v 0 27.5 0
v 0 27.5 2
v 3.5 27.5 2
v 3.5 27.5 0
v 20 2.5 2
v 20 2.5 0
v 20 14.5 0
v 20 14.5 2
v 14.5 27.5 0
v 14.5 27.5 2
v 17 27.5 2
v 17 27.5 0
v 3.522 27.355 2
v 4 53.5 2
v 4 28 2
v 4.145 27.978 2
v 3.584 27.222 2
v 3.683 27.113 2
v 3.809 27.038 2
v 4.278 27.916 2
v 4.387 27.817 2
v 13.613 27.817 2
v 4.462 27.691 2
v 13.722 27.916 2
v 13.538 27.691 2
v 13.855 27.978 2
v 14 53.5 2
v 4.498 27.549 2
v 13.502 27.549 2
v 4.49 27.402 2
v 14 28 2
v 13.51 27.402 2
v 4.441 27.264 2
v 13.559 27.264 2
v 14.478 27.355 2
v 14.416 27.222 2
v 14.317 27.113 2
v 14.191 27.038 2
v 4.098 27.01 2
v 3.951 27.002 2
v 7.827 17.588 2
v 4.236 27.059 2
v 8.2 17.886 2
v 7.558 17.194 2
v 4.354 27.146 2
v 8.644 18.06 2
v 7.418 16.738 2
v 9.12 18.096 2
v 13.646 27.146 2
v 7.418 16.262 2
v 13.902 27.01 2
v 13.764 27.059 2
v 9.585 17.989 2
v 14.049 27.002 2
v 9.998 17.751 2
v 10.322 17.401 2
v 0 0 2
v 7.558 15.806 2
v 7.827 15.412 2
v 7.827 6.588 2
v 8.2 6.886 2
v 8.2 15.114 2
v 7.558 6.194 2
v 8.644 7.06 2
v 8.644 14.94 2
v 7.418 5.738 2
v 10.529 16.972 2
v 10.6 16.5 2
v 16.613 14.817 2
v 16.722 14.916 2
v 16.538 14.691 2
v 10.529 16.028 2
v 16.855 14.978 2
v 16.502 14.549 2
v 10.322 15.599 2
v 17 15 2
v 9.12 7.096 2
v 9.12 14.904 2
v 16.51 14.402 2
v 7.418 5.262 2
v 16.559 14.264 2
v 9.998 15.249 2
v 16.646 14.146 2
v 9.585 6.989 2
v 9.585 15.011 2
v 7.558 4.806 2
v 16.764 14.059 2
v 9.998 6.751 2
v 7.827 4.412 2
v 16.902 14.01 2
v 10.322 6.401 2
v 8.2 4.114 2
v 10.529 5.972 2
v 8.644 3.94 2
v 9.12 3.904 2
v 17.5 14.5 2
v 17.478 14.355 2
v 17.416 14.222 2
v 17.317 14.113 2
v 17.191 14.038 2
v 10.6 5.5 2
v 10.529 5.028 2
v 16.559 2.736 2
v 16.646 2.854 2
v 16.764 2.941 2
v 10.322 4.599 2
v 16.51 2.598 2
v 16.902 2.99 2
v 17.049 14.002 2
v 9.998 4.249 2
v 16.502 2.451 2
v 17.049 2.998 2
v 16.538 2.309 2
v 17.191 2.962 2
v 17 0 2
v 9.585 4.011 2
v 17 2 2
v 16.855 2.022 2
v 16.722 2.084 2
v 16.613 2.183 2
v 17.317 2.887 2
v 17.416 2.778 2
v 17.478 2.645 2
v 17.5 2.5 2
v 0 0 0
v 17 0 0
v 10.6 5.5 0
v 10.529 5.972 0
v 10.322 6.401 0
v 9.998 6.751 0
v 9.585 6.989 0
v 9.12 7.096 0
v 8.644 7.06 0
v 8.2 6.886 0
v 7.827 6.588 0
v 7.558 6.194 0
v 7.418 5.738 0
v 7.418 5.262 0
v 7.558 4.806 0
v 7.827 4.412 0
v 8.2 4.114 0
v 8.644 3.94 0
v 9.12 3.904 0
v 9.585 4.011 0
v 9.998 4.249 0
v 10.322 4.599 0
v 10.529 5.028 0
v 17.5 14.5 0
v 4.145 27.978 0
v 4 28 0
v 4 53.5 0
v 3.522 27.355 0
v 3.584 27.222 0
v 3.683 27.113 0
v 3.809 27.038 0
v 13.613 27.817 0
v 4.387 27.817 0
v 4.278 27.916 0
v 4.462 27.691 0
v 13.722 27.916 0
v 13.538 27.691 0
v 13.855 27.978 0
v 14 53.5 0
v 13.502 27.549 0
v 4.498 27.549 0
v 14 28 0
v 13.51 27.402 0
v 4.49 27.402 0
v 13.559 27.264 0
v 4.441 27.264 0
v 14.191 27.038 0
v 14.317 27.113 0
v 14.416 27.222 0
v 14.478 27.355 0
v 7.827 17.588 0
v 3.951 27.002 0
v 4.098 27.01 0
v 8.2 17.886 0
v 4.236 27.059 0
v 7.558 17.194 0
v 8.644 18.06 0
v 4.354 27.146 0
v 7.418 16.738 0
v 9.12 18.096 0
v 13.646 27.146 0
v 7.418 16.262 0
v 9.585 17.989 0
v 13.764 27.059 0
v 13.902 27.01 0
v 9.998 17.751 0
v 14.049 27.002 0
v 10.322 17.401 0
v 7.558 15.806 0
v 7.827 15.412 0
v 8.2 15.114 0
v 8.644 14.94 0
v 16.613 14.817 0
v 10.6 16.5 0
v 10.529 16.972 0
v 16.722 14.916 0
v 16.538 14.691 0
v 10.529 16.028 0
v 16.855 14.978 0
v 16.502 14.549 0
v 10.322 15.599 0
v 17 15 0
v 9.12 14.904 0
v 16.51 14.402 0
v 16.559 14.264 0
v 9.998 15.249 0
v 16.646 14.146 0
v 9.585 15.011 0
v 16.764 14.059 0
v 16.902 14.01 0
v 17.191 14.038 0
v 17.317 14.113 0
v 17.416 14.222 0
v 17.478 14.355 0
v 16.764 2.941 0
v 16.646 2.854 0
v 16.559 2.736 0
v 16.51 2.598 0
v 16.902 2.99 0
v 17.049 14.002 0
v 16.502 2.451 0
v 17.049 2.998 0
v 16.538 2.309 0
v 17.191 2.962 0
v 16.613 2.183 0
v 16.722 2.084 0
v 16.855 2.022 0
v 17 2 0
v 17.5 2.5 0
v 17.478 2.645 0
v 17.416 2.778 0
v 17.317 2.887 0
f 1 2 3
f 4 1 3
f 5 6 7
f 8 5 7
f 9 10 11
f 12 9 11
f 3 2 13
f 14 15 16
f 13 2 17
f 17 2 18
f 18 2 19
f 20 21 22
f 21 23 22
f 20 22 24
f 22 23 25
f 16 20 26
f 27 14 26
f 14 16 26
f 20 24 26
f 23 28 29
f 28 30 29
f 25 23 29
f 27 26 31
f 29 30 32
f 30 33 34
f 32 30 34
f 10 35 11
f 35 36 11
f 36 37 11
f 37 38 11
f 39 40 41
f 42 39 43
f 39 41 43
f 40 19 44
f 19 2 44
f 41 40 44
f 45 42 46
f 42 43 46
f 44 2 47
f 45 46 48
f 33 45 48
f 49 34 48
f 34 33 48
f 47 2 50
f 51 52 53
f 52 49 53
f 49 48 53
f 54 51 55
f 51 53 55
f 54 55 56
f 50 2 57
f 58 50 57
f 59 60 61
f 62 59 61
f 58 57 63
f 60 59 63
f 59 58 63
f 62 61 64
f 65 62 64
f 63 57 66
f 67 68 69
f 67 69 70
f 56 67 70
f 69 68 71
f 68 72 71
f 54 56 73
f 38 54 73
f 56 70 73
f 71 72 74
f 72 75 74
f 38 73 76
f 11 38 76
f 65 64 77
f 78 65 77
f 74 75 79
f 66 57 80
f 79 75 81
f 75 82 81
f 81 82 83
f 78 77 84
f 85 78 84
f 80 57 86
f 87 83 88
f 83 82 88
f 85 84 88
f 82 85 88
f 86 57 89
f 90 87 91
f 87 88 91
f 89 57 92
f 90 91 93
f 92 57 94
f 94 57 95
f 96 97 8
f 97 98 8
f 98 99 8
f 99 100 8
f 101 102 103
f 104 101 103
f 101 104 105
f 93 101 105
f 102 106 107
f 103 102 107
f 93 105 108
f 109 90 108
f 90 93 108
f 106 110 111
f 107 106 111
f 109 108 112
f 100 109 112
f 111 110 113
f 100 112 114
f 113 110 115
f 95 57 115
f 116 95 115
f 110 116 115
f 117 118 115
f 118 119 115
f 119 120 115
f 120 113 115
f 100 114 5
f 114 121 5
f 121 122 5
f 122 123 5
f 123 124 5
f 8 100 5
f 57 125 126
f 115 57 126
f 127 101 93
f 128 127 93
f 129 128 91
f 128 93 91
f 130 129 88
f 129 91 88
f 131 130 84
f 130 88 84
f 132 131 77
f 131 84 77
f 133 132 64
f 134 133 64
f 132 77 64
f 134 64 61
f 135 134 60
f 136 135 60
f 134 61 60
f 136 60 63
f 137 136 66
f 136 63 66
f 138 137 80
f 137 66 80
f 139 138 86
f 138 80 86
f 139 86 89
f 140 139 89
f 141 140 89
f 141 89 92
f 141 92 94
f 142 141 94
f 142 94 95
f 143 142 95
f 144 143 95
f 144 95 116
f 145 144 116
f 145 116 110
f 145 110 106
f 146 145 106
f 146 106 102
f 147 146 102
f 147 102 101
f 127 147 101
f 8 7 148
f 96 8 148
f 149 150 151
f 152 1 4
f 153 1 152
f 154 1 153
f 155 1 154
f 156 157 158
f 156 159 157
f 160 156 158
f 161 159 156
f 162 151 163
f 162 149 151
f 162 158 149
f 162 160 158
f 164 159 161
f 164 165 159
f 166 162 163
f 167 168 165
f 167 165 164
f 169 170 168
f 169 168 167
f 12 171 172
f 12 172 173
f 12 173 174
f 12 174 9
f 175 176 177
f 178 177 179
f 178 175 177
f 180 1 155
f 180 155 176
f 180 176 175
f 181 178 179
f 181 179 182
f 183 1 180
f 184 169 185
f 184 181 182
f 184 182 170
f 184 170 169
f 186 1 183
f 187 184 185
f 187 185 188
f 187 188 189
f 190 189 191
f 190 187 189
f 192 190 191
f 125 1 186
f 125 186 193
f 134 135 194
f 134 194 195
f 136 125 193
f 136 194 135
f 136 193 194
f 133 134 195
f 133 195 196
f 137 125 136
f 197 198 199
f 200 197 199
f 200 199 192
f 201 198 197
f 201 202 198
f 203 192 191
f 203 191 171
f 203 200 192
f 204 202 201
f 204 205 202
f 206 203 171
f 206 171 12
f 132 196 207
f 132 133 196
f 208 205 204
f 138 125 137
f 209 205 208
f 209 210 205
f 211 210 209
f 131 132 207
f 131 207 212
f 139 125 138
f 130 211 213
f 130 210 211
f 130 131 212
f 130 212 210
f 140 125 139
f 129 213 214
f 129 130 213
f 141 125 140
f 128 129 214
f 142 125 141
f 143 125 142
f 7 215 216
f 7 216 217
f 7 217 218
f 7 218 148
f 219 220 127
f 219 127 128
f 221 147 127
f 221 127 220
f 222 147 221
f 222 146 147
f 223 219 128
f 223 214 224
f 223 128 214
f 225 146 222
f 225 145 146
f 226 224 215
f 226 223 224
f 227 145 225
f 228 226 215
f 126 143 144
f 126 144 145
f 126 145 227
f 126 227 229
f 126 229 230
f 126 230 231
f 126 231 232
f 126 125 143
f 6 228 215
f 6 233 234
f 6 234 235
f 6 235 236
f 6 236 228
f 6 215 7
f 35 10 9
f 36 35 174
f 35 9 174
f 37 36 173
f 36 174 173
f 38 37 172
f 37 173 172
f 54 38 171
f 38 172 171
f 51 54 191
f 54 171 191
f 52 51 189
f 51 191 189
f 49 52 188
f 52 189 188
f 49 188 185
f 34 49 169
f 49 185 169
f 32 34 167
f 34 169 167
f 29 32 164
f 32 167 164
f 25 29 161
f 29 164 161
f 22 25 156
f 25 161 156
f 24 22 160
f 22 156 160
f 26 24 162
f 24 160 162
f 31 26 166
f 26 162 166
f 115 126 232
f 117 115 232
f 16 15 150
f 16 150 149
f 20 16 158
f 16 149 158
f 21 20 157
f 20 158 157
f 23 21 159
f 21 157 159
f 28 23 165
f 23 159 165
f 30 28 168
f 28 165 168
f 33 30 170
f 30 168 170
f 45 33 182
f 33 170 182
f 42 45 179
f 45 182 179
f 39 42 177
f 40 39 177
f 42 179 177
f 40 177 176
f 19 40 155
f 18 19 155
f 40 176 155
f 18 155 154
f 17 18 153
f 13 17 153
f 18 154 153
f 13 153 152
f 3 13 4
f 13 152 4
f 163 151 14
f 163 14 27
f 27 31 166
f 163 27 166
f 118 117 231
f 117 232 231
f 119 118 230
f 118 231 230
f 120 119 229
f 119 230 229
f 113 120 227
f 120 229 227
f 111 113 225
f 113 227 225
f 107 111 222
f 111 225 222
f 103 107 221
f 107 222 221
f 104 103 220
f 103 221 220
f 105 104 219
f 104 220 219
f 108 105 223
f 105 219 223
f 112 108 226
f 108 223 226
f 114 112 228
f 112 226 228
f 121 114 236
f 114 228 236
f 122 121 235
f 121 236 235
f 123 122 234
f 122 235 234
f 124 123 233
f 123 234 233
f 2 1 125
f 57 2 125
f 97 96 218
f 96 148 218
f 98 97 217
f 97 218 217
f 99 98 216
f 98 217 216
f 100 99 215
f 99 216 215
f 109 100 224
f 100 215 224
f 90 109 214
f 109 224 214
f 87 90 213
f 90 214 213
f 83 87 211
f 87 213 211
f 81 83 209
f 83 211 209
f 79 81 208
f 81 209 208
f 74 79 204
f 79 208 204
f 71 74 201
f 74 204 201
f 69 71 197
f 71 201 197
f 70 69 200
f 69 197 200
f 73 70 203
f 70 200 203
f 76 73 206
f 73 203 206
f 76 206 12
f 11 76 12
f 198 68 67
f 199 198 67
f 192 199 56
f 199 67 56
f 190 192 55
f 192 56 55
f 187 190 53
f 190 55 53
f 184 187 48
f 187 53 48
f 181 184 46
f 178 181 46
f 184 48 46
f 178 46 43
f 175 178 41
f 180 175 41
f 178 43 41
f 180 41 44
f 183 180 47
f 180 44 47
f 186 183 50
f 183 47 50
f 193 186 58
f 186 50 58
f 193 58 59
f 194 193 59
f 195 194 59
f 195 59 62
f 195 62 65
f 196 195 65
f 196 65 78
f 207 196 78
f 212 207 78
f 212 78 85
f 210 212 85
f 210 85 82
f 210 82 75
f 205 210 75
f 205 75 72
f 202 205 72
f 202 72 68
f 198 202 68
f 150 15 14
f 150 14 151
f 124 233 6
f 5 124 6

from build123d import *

# Parameters (mm, degrees)
EXTRUDE_1_DEPTH     = 2
SKETCH_2_R          = 1.6
CUT_EXTRUDE_1_DEPTH = 3
SKETCH_3_W          = 3
SKETCH_3_H          = 24
SKETCH_3_W_2        = 4
CUT_EXTRUDE_2_DEPTH = 3
SKETCH_4_W          = 10
SKETCH_4_H          = 2
EXTRUDE_2_DEPTH     = 2
SKETCH_5_R          = 0.5
CUT_EXTRUDE_3_DEPTH = 2
SKETCH_6_R          = 0.5
CUT_EXTRUDE_4_DEPTH = 2


with BuildPart() as part:
    # 草图1 → 凸台-拉伸1 (new body)
    with BuildSketch(Plane.XY):
        Polygon((0, 0), (17, 0), (17, 2.5), (20, 2.5), (20, 14.5), (17, 14.5), (17, 51.5), (0, 51.5), align=None)
    extrude(amount=EXTRUDE_1_DEPTH)

    # 草图2 → 切除-拉伸1 (cut, through all)
    with BuildSketch(Plane.XY.offset(2)):
        with Locations((9, 5.5)):
            Circle(SKETCH_2_R)
        with Locations((9, 16.5)):
            Circle(SKETCH_2_R)
    extrude(amount=-CUT_EXTRUDE_1_DEPTH, mode=Mode.SUBTRACT)

    # 草图3 → 切除-拉伸2 (cut, through all)
    with BuildSketch(Plane.XY.offset(2)):
        with Locations((15.5, 39.5)):
            Rectangle(SKETCH_3_W, SKETCH_3_H)
        with Locations((2, 39.5)):
            Rectangle(SKETCH_3_W_2, SKETCH_3_H)
    extrude(amount=-CUT_EXTRUDE_2_DEPTH, mode=Mode.SUBTRACT)

    # 草图4 → 凸台-拉伸2 (add)
    with BuildSketch(Plane(origin=(0, 51.5, 0), x_dir=(1, 0, 0), z_dir=(0, 1, 0))):
        with Locations((9, -1)):
            Rectangle(SKETCH_4_W, SKETCH_4_H)
    extrude(amount=EXTRUDE_2_DEPTH)

    # 草图5 → 切除-拉伸3 (cut)
    with BuildSketch(Plane(origin=(0, 0, 0), x_dir=(-1, 0, 0), z_dir=(0, 0, -1))):
        with Locations((-14, 27.5)):
            Circle(SKETCH_5_R)
        with Locations((-4, 27.5)):
            Circle(SKETCH_5_R)
    extrude(amount=-CUT_EXTRUDE_3_DEPTH, mode=Mode.SUBTRACT)

    # 草图6 → 切除-拉伸4 (cut)
    with BuildSketch(Plane(origin=(0, 0, 0), x_dir=(-1, 0, 0), z_dir=(0, 0, -1))):
        with Locations((-17, 14.5)):
            Circle(SKETCH_6_R)
        with Locations((-17, 2.5)):
            Circle(SKETCH_6_R)
    extrude(amount=-CUT_EXTRUDE_4_DEPTH, mode=Mode.SUBTRACT)


solid = part.part
